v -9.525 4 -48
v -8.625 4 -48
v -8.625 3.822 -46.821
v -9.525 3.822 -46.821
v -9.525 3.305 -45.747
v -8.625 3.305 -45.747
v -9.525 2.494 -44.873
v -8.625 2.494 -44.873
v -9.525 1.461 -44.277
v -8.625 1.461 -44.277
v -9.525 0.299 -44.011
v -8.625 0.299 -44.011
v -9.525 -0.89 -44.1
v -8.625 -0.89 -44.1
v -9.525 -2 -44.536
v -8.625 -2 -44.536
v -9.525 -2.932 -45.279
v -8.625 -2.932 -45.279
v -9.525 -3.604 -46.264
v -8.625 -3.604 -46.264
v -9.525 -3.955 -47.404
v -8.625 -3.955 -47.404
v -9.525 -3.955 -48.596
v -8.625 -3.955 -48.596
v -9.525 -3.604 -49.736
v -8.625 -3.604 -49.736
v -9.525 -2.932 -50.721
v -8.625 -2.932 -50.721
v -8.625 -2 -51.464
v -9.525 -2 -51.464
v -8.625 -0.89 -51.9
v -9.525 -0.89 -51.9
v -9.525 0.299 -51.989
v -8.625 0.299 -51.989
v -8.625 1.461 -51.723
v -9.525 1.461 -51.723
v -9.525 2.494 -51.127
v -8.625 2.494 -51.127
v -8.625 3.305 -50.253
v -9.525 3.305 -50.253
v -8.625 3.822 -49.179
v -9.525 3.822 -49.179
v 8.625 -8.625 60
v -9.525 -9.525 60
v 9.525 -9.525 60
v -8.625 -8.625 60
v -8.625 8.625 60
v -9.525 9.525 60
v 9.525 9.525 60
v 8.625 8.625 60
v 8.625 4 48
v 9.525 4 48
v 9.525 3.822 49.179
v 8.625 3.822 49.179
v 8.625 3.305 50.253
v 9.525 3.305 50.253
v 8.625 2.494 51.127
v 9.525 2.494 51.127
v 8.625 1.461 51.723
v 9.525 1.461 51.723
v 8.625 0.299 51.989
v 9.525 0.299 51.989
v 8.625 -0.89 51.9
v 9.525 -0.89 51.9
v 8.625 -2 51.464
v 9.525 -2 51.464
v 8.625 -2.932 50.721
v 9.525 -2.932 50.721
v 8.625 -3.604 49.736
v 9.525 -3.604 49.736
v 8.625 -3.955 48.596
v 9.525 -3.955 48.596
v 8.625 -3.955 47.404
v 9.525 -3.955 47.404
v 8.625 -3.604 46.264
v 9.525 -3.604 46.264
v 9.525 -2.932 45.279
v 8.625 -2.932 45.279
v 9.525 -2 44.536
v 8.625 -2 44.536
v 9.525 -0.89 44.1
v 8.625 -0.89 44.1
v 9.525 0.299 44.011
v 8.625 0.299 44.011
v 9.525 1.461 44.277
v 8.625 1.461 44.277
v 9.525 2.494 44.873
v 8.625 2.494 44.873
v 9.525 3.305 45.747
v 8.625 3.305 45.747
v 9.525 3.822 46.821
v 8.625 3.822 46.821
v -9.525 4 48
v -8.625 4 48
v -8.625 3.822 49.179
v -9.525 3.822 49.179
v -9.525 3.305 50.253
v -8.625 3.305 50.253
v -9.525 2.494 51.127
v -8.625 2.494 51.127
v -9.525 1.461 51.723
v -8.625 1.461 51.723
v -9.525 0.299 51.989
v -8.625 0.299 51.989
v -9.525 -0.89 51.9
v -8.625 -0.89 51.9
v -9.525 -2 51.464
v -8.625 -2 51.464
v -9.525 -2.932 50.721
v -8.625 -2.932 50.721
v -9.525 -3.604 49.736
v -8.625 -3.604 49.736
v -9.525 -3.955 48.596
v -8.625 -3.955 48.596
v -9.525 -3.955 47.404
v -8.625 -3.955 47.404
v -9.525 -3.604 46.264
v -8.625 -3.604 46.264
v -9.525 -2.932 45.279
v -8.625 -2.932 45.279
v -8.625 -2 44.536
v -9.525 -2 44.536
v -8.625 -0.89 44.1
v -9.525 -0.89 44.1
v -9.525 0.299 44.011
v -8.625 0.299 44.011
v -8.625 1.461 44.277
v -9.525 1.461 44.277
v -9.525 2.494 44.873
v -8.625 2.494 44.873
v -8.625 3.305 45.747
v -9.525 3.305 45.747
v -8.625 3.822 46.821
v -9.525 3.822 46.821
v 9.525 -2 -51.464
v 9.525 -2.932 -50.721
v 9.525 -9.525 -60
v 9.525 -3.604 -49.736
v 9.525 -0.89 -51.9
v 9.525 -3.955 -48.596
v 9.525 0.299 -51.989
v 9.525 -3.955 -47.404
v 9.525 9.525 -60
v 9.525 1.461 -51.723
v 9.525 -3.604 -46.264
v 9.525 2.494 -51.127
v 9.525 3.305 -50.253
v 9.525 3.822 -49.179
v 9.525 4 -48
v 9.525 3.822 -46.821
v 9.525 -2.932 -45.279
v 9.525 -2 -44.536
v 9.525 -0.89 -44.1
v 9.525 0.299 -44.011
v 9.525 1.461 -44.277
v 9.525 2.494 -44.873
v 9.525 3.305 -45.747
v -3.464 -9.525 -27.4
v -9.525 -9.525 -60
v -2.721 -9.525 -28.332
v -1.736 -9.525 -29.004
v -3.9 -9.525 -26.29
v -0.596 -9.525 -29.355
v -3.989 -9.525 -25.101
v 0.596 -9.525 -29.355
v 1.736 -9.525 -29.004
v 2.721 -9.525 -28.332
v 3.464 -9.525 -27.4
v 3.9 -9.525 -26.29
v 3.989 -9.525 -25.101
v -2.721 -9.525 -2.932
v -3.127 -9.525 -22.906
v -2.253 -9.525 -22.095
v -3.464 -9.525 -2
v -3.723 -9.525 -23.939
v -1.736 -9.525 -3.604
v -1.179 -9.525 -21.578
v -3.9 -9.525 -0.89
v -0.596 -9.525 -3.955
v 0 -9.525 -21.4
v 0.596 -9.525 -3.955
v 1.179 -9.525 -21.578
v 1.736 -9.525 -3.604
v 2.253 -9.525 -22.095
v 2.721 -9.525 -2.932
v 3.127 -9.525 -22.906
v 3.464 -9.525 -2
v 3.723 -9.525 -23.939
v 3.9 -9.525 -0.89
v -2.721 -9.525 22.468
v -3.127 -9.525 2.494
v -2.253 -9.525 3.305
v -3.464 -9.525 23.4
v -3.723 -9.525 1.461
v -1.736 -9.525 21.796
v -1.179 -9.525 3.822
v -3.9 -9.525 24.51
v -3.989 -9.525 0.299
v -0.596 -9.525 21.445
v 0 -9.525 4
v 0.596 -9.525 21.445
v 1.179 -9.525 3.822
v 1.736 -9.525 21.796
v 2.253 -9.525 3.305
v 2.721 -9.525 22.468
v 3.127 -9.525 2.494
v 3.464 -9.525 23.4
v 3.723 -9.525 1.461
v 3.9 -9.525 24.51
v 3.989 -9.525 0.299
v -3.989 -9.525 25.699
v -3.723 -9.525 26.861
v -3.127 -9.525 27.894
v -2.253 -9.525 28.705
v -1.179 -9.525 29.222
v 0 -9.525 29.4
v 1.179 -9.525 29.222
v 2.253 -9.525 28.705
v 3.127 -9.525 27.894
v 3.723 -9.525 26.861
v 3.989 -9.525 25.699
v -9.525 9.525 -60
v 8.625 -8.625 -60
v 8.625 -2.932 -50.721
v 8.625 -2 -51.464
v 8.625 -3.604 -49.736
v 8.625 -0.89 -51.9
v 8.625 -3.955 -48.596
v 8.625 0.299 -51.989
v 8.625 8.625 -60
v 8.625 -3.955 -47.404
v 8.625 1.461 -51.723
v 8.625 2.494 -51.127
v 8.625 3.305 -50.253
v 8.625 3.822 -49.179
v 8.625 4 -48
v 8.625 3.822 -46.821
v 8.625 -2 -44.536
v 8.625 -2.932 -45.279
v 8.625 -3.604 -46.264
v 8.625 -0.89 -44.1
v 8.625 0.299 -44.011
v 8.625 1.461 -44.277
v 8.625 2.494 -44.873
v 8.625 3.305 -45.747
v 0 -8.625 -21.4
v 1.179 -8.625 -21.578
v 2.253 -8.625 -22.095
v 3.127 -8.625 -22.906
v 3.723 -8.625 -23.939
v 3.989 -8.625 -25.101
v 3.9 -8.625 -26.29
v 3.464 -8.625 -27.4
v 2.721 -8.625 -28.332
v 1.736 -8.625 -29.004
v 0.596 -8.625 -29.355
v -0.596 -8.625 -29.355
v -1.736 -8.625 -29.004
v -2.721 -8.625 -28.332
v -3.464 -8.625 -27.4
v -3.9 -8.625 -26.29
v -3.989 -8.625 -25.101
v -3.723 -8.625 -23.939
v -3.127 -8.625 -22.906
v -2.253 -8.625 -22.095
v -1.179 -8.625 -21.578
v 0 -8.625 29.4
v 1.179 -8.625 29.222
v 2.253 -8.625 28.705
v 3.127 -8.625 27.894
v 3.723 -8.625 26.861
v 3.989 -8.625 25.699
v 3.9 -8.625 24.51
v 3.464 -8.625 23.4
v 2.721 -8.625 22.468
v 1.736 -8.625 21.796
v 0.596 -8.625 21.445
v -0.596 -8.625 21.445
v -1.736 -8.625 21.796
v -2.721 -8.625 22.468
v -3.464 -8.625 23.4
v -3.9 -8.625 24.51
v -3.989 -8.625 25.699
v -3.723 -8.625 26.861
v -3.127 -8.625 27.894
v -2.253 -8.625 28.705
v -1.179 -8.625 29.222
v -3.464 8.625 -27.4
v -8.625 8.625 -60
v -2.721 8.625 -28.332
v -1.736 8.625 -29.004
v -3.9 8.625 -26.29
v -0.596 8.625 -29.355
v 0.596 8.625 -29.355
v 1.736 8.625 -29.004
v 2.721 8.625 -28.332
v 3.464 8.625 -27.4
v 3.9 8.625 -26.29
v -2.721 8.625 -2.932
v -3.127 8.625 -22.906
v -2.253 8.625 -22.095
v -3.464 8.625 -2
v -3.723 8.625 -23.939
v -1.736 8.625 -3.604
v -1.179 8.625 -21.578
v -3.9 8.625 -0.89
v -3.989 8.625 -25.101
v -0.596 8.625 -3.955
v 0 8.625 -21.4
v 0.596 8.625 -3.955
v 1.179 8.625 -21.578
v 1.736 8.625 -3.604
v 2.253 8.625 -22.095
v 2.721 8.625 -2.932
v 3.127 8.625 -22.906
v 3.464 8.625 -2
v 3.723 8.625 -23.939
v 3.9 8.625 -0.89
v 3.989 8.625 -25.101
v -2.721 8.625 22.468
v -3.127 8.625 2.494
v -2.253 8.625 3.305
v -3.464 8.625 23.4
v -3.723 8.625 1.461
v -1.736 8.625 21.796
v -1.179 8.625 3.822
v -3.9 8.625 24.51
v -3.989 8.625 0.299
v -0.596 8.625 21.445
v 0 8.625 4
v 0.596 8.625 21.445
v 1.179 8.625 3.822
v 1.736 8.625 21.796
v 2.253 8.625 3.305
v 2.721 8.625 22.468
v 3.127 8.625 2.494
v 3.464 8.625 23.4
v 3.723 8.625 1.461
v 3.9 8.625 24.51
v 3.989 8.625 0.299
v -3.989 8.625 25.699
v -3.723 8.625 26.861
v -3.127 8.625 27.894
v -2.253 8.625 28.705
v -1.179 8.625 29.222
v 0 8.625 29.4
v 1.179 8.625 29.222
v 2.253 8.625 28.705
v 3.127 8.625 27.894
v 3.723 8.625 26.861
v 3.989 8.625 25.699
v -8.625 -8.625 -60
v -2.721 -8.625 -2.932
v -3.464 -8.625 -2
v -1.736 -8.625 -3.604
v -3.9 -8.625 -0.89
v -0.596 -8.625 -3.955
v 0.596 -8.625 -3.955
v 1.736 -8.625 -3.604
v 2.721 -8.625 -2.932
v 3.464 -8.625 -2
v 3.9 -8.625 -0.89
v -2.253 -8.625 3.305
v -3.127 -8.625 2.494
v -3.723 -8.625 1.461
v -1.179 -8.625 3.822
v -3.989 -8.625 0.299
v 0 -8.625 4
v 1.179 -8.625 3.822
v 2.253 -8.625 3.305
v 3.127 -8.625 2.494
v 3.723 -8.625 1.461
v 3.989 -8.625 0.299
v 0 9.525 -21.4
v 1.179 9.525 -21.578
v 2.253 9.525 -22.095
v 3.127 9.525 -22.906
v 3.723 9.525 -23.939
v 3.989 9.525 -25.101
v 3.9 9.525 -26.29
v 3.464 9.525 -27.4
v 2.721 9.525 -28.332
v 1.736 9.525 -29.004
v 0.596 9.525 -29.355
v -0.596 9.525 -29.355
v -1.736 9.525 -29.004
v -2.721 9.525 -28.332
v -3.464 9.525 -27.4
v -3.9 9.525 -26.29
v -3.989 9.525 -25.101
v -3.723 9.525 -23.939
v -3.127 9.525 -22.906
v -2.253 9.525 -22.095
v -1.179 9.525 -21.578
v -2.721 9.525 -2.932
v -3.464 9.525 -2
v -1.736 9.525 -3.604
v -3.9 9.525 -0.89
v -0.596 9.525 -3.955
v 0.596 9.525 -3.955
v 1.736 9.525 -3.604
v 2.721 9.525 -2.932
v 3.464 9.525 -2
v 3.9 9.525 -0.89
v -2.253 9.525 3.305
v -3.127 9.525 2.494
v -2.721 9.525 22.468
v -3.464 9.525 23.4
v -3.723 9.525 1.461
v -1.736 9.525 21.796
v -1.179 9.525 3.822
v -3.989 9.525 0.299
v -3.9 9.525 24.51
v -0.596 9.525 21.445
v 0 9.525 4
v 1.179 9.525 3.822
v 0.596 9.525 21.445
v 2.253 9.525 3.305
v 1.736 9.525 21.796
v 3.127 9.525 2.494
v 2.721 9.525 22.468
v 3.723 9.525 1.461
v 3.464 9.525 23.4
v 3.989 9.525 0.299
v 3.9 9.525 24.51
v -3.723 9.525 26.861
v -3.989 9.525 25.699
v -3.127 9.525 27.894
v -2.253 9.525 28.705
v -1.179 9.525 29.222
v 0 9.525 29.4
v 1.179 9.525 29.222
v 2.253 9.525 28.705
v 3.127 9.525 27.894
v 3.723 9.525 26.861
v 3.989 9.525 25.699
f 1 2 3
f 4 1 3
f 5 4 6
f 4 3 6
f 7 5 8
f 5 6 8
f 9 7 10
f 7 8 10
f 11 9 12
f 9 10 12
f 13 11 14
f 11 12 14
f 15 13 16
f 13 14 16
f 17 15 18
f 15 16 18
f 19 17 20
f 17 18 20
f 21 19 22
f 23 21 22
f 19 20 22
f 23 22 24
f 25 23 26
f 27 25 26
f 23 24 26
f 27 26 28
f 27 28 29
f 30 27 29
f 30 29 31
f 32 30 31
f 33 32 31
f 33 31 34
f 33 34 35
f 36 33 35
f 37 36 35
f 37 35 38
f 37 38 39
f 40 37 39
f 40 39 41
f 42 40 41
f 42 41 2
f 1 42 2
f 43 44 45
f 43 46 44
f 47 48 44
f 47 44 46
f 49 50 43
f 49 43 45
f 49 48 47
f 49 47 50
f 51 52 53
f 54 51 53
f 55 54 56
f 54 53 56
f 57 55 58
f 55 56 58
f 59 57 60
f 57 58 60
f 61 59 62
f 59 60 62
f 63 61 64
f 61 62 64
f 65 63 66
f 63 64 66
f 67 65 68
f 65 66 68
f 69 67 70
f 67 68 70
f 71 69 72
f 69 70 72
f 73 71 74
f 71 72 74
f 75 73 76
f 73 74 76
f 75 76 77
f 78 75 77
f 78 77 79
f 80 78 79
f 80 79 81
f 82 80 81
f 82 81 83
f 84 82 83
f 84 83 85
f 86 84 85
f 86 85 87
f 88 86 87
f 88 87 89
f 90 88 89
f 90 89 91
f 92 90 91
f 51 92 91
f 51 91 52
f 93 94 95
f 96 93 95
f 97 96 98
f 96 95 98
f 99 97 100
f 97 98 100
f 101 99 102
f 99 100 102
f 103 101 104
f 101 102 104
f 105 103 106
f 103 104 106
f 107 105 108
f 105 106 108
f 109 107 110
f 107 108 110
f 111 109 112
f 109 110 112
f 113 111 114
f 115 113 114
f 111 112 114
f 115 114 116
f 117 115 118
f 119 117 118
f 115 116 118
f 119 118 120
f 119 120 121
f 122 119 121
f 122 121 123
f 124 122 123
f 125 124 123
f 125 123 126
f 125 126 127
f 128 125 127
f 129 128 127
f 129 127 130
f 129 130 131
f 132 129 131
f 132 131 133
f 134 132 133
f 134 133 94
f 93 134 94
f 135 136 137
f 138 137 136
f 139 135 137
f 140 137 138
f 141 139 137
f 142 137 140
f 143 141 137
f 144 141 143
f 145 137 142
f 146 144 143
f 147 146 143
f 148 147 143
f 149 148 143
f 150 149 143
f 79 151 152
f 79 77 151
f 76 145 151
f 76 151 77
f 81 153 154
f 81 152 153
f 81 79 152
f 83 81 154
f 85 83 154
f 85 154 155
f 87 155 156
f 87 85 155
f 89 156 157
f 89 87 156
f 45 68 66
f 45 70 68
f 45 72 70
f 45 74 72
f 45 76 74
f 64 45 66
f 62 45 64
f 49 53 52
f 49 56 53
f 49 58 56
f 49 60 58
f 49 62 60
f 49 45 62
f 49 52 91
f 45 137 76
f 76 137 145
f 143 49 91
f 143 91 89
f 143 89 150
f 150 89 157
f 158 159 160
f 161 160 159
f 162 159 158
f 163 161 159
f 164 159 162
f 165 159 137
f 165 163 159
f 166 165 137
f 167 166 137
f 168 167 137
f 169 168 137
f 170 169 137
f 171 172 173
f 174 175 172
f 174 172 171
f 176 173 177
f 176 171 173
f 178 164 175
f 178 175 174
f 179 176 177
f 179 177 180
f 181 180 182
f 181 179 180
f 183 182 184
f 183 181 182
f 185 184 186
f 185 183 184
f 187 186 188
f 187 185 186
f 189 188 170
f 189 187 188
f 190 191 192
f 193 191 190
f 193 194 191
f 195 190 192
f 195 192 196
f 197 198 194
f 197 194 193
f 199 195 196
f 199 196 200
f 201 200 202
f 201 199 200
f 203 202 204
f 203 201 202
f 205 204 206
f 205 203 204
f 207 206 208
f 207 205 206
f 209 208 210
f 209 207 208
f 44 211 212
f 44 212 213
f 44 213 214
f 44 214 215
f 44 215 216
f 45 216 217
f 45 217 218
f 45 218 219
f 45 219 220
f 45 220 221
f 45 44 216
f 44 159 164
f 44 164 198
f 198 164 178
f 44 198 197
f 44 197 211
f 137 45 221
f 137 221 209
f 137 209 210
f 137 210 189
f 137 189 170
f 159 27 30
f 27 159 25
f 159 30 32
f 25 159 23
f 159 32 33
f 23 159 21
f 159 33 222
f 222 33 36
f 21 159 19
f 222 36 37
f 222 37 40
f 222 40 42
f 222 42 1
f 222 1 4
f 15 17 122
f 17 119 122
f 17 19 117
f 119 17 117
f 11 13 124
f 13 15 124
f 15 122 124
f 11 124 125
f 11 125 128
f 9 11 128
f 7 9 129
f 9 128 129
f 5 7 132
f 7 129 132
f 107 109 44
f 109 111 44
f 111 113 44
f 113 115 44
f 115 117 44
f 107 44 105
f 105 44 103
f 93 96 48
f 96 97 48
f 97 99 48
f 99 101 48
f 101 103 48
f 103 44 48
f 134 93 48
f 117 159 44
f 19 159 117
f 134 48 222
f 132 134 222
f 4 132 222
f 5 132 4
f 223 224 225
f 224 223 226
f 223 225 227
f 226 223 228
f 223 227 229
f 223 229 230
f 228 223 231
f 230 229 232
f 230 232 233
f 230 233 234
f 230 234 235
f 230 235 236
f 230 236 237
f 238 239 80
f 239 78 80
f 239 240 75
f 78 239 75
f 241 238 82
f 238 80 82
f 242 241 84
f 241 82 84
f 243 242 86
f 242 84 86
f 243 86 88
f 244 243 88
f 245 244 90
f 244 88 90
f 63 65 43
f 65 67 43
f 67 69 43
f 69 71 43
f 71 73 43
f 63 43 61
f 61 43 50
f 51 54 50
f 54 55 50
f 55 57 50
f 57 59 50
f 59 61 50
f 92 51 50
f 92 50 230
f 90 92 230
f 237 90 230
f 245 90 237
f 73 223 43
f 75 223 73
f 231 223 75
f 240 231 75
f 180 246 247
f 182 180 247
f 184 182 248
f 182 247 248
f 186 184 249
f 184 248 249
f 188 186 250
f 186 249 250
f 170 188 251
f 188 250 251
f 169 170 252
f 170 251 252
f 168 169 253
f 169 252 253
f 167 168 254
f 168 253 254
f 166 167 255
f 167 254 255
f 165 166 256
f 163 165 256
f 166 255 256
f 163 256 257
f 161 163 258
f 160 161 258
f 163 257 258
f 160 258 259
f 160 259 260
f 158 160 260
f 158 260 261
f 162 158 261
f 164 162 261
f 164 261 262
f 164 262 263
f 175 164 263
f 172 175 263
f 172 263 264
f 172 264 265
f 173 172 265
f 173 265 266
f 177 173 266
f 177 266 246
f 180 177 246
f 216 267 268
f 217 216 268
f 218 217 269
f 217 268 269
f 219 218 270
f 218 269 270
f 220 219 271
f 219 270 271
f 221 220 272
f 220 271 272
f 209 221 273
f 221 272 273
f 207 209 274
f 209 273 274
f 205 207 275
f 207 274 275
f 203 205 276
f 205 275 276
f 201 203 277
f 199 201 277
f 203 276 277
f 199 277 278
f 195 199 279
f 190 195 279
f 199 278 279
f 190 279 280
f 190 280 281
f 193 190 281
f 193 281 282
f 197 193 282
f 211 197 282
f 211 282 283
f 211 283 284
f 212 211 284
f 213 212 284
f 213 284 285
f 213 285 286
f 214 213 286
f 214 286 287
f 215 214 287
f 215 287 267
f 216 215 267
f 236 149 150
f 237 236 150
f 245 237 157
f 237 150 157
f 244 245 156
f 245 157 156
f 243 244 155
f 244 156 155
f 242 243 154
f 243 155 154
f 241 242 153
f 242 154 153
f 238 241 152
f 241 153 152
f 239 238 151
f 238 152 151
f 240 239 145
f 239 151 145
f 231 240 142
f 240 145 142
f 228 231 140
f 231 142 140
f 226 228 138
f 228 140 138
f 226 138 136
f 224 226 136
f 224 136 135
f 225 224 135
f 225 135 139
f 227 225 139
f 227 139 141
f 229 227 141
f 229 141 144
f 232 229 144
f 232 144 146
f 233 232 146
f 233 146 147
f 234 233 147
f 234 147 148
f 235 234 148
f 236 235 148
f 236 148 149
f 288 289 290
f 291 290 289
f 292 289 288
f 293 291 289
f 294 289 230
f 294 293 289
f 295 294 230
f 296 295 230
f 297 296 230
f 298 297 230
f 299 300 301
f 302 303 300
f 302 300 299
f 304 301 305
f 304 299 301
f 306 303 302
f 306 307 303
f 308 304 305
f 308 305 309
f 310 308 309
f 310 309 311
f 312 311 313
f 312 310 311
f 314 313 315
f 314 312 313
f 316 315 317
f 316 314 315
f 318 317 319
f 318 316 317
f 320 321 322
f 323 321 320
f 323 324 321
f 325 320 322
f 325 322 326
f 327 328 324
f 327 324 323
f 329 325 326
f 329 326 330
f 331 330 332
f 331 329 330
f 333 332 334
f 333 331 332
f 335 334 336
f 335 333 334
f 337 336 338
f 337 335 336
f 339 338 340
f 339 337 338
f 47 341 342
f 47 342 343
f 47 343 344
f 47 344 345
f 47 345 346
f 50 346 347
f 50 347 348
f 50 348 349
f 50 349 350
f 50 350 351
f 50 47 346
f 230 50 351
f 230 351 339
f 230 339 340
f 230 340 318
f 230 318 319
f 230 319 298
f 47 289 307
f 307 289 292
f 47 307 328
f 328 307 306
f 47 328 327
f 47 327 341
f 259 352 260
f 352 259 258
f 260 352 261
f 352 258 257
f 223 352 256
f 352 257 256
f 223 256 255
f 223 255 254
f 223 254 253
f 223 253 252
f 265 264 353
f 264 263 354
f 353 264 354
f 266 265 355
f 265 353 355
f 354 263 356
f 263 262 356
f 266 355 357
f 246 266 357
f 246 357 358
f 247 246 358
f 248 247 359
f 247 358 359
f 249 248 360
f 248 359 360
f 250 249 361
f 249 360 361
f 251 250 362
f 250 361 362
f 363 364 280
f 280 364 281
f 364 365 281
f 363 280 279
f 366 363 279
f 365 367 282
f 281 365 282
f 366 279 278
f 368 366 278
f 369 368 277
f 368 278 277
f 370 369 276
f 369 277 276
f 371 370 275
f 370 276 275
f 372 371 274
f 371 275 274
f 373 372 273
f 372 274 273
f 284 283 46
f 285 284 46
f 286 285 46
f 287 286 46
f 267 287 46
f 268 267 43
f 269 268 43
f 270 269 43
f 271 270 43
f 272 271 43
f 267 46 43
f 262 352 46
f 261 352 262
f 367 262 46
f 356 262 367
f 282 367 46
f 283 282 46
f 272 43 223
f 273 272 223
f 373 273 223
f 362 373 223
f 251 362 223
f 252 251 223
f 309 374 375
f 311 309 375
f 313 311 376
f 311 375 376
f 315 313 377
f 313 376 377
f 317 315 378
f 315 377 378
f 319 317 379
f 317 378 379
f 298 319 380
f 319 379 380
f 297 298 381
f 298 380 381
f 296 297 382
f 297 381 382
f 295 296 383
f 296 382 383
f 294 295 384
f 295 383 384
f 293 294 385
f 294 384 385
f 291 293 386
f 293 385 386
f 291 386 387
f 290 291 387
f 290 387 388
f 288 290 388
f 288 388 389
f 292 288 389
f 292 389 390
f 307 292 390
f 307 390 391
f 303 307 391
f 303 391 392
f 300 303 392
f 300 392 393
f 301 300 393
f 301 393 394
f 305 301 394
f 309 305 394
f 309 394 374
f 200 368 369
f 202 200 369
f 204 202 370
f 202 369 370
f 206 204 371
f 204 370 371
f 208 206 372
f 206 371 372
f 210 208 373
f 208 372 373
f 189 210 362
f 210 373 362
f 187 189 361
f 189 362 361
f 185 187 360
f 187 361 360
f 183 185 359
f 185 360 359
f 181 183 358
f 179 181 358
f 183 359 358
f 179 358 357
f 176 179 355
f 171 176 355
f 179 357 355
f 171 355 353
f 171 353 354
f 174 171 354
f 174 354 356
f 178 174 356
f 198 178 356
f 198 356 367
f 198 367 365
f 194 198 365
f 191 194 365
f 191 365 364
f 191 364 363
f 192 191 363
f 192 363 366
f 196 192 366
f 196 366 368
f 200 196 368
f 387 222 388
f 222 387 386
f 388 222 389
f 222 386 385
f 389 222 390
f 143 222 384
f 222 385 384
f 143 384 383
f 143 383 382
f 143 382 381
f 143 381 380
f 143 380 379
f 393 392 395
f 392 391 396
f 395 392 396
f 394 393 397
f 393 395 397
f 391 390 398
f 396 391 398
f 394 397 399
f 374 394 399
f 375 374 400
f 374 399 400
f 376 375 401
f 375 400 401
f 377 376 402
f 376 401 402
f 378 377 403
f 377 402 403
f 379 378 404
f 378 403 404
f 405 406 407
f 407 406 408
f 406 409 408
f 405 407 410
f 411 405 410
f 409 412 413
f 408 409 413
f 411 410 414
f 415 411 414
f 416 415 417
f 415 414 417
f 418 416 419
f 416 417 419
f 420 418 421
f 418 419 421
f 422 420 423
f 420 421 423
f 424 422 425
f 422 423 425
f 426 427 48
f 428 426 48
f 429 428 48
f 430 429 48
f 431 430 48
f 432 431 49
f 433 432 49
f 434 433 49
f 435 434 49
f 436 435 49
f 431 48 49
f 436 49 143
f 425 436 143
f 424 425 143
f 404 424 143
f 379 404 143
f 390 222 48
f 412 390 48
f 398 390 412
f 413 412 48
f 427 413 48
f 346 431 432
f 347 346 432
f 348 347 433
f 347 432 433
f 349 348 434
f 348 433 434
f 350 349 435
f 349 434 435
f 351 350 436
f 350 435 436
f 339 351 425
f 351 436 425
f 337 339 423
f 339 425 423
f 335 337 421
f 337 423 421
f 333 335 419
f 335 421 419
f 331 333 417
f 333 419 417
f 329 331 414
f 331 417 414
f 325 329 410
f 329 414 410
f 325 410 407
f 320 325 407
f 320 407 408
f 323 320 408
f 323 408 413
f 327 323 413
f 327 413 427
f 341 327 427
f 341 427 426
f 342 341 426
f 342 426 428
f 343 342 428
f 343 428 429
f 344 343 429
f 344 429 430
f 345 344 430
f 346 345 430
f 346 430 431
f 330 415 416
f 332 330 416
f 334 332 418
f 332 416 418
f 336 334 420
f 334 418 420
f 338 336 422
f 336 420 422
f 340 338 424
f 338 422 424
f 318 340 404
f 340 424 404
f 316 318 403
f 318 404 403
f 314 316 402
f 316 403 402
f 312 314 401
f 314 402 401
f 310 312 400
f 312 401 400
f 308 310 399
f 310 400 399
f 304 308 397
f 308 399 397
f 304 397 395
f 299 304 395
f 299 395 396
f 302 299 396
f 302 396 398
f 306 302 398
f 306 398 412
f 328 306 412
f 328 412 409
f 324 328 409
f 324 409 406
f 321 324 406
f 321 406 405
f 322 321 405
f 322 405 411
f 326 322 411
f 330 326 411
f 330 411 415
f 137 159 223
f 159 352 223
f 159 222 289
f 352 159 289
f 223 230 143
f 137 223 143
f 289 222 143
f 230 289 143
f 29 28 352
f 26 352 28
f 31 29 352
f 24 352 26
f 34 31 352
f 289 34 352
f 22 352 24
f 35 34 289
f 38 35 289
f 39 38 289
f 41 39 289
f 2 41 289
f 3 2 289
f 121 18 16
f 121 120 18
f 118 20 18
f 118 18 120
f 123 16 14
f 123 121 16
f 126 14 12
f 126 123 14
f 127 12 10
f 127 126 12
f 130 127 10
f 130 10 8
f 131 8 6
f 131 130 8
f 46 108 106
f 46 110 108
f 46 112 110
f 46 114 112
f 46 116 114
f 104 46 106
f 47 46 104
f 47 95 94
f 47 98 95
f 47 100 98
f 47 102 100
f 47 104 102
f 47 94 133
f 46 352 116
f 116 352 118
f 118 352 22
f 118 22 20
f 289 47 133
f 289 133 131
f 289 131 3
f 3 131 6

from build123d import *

# Parameters (mm, degrees)
SKETCH1_W           = 19.05
SKETCH1_H           = 19.05
SKETCH1_W_2         = 17.25
SKETCH1_H_2         = 17.25
EXTRUDE_THIN1_DEPTH = 60
SKETCH2_R           = 4
CUT_EXTRUDE1_DEPTH  = 64.668109168
SKETCH3_R           = 4
CUT_EXTRUDE2_DEPTH  = 64.668109168


with BuildPart() as part:
    # Sketch1 → Extrude-Thin1 (new, symmetric)
    with BuildSketch(Plane.XY):
        Rectangle(SKETCH1_W, SKETCH1_H)
        Rectangle(SKETCH1_W_2, SKETCH1_H_2, mode=Mode.SUBTRACT)
    extrude(amount=EXTRUDE_THIN1_DEPTH, both=True)

    # Sketch2 → Cut-Extrude1 (cut, through all)
    with BuildSketch(Plane(origin=(9.525, 0, 0), x_dir=(0, 0, -1), z_dir=(1, 0, 0))):
        with Locations(Location((-48, 0, 0), (0, 0, 90))):
            Circle(SKETCH2_R)
        with Locations(Location((48, 0, 0), (0, 0, 90))):
            Circle(SKETCH2_R)
    extrude(amount=-CUT_EXTRUDE1_DEPTH, mode=Mode.SUBTRACT)

    # Sketch3 → Cut-Extrude2 (cut, through all)
    with BuildSketch(Plane(origin=(0, 9.525, 0), x_dir=(1, 0, 0), z_dir=(0, 1, 0))):
        with Locations(Location((0, -25.4, 0), (0, 0, 270))):
            Circle(SKETCH3_R)
        with Locations(Location((0, 25.4, 0), (0, 0, 270))):
            Circle(SKETCH3_R)
        with Locations(Location((0, 0, 0), (0, 0, 270))):
            Circle(SKETCH3_R)
    extrude(amount=-CUT_EXTRUDE2_DEPTH, mode=Mode.SUBTRACT)


solid = part.part
